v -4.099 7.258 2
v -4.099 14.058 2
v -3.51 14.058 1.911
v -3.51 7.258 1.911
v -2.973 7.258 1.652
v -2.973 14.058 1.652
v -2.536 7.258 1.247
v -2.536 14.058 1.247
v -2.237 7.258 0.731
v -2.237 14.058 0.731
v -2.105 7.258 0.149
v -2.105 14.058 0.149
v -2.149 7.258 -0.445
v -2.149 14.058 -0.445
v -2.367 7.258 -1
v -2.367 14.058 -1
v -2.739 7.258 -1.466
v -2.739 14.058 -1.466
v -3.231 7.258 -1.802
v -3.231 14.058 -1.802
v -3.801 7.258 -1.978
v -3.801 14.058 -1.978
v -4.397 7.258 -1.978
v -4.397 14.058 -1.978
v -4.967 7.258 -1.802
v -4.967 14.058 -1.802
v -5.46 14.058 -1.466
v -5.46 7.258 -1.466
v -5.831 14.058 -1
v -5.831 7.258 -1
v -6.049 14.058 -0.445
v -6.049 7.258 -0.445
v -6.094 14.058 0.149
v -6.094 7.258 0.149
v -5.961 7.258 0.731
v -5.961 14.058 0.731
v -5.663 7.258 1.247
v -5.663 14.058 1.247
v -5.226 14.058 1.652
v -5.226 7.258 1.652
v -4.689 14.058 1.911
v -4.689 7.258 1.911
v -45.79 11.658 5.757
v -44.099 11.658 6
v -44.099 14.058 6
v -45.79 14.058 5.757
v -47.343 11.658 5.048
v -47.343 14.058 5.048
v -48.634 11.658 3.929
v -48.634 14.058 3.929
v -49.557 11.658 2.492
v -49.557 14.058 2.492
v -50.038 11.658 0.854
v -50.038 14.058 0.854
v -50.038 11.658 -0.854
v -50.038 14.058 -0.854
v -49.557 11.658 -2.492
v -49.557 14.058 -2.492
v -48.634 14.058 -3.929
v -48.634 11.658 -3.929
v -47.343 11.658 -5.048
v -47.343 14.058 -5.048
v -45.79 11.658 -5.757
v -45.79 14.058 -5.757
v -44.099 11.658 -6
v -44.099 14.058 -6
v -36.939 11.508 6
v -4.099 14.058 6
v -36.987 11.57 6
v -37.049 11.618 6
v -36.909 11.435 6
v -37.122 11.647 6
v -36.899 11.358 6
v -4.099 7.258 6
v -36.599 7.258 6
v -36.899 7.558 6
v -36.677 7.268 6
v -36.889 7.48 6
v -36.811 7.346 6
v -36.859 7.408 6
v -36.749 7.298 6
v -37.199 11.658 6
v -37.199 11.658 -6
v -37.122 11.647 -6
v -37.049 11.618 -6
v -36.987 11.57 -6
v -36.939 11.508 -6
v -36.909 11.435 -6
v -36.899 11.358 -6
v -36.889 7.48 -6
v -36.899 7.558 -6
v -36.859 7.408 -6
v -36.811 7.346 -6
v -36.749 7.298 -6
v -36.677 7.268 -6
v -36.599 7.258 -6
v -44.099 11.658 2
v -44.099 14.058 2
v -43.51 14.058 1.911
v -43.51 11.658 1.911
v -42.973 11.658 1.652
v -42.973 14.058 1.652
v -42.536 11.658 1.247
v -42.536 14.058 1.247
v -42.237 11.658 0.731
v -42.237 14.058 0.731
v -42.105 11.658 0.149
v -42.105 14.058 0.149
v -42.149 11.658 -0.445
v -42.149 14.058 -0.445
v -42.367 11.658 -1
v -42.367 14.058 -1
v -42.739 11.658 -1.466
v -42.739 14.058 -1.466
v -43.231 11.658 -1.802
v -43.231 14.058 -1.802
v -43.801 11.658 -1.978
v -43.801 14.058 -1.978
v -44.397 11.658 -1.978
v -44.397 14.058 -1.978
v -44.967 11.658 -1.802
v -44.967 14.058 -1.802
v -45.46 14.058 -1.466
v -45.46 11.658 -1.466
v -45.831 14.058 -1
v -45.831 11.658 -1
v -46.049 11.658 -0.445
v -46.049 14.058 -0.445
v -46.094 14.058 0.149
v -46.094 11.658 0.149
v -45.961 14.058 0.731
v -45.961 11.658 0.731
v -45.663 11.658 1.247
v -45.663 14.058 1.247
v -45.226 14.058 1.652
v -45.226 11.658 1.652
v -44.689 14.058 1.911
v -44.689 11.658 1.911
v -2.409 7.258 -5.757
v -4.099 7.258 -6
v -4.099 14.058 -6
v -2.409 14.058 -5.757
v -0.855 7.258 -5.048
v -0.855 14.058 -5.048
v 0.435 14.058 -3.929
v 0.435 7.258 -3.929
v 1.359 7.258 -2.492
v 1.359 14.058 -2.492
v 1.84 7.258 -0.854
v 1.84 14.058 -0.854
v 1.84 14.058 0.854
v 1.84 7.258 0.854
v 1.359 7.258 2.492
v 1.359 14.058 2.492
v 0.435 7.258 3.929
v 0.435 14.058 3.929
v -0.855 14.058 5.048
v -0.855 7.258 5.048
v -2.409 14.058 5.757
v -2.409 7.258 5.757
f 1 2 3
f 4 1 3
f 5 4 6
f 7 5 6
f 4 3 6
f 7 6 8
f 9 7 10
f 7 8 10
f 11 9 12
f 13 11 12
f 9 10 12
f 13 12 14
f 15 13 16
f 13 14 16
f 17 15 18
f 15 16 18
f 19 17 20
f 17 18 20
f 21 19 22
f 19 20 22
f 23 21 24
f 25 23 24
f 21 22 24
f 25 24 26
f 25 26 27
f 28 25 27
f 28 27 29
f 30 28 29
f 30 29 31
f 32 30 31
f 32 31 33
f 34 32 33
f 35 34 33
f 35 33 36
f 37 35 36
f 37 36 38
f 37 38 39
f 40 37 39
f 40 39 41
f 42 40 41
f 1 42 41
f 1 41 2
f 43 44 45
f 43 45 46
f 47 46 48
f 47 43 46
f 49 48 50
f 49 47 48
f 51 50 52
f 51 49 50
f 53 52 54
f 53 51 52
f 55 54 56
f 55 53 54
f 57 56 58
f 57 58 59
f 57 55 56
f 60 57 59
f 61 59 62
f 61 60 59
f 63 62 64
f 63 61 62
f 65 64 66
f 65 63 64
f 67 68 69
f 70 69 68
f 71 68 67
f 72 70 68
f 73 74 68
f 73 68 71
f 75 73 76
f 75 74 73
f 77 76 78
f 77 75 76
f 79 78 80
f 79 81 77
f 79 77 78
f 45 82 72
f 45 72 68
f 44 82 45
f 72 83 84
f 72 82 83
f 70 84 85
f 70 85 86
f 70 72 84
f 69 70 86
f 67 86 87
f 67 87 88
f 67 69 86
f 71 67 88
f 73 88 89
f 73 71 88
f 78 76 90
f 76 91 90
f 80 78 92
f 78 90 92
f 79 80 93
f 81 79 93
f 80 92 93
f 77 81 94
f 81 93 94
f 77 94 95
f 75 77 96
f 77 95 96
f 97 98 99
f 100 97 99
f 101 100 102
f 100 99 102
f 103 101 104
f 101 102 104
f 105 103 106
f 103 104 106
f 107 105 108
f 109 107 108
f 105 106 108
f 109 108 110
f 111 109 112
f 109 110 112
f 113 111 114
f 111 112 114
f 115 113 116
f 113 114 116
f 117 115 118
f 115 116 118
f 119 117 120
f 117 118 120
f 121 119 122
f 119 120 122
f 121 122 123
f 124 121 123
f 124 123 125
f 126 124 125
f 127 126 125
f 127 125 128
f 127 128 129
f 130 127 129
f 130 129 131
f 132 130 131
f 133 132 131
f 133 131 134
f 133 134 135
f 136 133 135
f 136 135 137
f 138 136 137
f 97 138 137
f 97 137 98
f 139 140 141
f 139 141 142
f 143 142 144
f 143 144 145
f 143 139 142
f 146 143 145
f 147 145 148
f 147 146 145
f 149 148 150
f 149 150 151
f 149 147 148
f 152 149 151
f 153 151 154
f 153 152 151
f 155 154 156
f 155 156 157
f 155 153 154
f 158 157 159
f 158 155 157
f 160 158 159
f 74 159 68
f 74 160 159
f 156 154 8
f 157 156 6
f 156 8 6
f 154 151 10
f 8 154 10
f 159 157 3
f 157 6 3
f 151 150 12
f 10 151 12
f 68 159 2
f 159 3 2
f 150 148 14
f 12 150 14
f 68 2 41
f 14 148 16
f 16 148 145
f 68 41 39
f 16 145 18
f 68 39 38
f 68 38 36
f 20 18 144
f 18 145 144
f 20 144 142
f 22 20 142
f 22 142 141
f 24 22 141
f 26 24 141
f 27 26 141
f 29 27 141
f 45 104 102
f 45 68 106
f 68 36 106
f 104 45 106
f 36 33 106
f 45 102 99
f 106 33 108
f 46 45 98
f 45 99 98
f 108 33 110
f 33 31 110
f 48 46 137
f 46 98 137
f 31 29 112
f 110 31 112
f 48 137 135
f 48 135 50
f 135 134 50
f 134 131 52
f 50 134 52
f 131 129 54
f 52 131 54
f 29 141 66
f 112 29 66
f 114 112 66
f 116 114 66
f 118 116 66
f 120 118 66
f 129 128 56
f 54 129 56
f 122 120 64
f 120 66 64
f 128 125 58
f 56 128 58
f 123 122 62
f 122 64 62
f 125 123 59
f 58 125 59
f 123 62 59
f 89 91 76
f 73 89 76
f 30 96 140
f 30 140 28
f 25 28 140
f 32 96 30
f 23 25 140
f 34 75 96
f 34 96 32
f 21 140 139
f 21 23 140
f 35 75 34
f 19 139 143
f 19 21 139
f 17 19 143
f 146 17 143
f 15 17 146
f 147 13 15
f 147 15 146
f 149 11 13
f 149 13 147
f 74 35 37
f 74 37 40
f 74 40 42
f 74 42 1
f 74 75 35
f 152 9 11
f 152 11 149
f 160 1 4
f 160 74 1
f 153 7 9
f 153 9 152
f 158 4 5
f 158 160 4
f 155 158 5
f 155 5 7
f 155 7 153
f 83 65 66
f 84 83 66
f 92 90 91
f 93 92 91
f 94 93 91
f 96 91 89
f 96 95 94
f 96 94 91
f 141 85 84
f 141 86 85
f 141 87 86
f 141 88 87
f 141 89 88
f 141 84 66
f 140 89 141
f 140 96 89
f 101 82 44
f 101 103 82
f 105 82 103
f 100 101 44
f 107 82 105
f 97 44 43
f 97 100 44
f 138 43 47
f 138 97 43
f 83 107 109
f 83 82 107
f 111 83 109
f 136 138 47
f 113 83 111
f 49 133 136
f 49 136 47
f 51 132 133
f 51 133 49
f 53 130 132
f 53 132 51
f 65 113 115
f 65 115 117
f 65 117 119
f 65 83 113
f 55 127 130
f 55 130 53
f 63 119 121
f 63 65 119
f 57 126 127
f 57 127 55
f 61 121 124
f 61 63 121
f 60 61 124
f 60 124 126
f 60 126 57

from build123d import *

# Parameters (mm, degrees)
SKETCH1_R           = 2.4
BOSS_EXTRUDE1_DEPTH = 15
SKETCH2_R           = 2.4
CUT_EXTRUDE1_DEPTH  = 12
SKETCH3_W           = 81.763751064
SKETCH3_H           = 26.290001284
CUT_EXTRUDE2_DEPTH  = 5
SCALE1_SCALE        = 0.8
SKETCH4_R           = 2
CUT_EXTRUDE3_DEPTH  = 52.087489074
SKETCH5_W           = 42.014746782
SKETCH5_H           = 19.111045429
CUT_EXTRUDE4_DEPTH  = 1.2
FILLET1_R           = 0.3
FILLET3_R           = 0.3


with BuildPart() as part:
    # Sketch1 → Boss-Extrude1 (new body)
    with BuildSketch(Plane(origin=(0, 0, 0), x_dir=(1, 0, 0), z_dir=(0, 1, 0))):
        with BuildLine():
            Line((-50, 7.5), (0, 7.5))
            ThreePointArc((0, 7.5), (7.5, 0), (0, -7.5))
            Line((0, -7.5), (-50, -7.5))
            ThreePointArc((-50, -7.5), (-57.5, 0), (-50, 7.5))
        make_face()
        with Locations(Location((-50, 0, 0), (0, 0, 270))):
            Circle(SKETCH1_R, mode=Mode.SUBTRACT)
        with Locations(Location((0, 0, 0), (0, 0, 270))):
            Circle(SKETCH1_R, mode=Mode.SUBTRACT)
    extrude(amount=BOSS_EXTRUDE1_DEPTH)

    # Sketch2 → Cut-Extrude1 (cut)
    with BuildSketch(Plane(origin=(0, 0, 0), x_dir=(1, 0, 0), z_dir=(0, 1, 0))):
        with BuildLine():
            Line((-50, 7.5), (-41, 7.5))
            Line((-41, 7.5), (-41, -7.5))
            Line((-41, -7.5), (-50, -7.5))
            ThreePointArc((-50, -7.5), (-57.5, 0), (-50, 7.5))
        make_face()
        with Locations(Location((-50, 0, 0), (0, 0, 270))):
            Circle(SKETCH2_R, mode=Mode.SUBTRACT)
    extrude(amount=CUT_EXTRUDE1_DEPTH, mode=Mode.SUBTRACT)

    # Sketch3 → Cut-Extrude2 (cut)
    with BuildSketch(Plane.XZ):
        with Locations((-24.1072482, 0)):
            Rectangle(SKETCH3_W, SKETCH3_H)
    extrude(amount=-CUT_EXTRUDE2_DEPTH, mode=Mode.SUBTRACT)


with BuildPart() as part_1:
    # Scale1: scaled about (-20.496084793, 10.28858221, 0)
    add(part.part.scale(SCALE1_SCALE).moved(Location((-4.099216959, 2.057716442, 0))))

    # Sketch4 → Cut-Extrude3 (cut, through all)
    with BuildSketch(Plane(origin=(0, 14.057716442, 0), x_dir=(1, 0, 0), z_dir=(0, 1, 0))):
        with Locations(Location((-44.099216959, 0, 0), (0, 0, 270))):
            Circle(SKETCH4_R)
        with Locations(Location((-4.099216959, 0, 0), (0, 0, 270))):
            Circle(SKETCH4_R)
    extrude(amount=-CUT_EXTRUDE3_DEPTH, mode=Mode.SUBTRACT)

    # Sketch5 → Cut-Extrude4 (cut)
    with BuildSketch(Plane.XZ.offset(-6.057716442)):
        with Locations((-17.942307993, -0.717456632)):
            Rectangle(SKETCH5_W, SKETCH5_H)
    extrude(amount=-CUT_EXTRUDE4_DEPTH, mode=Mode.SUBTRACT)

    # Fillet1
    fillet1_edges = [part_1.edges().sort_by_distance(p)[0] for p in [
        (-36.899216959, 11.657716442, 0),
    ]]
    fillet(fillet1_edges, radius=FILLET1_R)

    # Fillet3
    fillet3_edges = [part_1.edges().sort_by_distance(p)[0] for p in [
        (-36.899216959, 7.257716442, 0),
    ]]
    fillet(fillet3_edges, radius=FILLET3_R)


solid = part_1.part
